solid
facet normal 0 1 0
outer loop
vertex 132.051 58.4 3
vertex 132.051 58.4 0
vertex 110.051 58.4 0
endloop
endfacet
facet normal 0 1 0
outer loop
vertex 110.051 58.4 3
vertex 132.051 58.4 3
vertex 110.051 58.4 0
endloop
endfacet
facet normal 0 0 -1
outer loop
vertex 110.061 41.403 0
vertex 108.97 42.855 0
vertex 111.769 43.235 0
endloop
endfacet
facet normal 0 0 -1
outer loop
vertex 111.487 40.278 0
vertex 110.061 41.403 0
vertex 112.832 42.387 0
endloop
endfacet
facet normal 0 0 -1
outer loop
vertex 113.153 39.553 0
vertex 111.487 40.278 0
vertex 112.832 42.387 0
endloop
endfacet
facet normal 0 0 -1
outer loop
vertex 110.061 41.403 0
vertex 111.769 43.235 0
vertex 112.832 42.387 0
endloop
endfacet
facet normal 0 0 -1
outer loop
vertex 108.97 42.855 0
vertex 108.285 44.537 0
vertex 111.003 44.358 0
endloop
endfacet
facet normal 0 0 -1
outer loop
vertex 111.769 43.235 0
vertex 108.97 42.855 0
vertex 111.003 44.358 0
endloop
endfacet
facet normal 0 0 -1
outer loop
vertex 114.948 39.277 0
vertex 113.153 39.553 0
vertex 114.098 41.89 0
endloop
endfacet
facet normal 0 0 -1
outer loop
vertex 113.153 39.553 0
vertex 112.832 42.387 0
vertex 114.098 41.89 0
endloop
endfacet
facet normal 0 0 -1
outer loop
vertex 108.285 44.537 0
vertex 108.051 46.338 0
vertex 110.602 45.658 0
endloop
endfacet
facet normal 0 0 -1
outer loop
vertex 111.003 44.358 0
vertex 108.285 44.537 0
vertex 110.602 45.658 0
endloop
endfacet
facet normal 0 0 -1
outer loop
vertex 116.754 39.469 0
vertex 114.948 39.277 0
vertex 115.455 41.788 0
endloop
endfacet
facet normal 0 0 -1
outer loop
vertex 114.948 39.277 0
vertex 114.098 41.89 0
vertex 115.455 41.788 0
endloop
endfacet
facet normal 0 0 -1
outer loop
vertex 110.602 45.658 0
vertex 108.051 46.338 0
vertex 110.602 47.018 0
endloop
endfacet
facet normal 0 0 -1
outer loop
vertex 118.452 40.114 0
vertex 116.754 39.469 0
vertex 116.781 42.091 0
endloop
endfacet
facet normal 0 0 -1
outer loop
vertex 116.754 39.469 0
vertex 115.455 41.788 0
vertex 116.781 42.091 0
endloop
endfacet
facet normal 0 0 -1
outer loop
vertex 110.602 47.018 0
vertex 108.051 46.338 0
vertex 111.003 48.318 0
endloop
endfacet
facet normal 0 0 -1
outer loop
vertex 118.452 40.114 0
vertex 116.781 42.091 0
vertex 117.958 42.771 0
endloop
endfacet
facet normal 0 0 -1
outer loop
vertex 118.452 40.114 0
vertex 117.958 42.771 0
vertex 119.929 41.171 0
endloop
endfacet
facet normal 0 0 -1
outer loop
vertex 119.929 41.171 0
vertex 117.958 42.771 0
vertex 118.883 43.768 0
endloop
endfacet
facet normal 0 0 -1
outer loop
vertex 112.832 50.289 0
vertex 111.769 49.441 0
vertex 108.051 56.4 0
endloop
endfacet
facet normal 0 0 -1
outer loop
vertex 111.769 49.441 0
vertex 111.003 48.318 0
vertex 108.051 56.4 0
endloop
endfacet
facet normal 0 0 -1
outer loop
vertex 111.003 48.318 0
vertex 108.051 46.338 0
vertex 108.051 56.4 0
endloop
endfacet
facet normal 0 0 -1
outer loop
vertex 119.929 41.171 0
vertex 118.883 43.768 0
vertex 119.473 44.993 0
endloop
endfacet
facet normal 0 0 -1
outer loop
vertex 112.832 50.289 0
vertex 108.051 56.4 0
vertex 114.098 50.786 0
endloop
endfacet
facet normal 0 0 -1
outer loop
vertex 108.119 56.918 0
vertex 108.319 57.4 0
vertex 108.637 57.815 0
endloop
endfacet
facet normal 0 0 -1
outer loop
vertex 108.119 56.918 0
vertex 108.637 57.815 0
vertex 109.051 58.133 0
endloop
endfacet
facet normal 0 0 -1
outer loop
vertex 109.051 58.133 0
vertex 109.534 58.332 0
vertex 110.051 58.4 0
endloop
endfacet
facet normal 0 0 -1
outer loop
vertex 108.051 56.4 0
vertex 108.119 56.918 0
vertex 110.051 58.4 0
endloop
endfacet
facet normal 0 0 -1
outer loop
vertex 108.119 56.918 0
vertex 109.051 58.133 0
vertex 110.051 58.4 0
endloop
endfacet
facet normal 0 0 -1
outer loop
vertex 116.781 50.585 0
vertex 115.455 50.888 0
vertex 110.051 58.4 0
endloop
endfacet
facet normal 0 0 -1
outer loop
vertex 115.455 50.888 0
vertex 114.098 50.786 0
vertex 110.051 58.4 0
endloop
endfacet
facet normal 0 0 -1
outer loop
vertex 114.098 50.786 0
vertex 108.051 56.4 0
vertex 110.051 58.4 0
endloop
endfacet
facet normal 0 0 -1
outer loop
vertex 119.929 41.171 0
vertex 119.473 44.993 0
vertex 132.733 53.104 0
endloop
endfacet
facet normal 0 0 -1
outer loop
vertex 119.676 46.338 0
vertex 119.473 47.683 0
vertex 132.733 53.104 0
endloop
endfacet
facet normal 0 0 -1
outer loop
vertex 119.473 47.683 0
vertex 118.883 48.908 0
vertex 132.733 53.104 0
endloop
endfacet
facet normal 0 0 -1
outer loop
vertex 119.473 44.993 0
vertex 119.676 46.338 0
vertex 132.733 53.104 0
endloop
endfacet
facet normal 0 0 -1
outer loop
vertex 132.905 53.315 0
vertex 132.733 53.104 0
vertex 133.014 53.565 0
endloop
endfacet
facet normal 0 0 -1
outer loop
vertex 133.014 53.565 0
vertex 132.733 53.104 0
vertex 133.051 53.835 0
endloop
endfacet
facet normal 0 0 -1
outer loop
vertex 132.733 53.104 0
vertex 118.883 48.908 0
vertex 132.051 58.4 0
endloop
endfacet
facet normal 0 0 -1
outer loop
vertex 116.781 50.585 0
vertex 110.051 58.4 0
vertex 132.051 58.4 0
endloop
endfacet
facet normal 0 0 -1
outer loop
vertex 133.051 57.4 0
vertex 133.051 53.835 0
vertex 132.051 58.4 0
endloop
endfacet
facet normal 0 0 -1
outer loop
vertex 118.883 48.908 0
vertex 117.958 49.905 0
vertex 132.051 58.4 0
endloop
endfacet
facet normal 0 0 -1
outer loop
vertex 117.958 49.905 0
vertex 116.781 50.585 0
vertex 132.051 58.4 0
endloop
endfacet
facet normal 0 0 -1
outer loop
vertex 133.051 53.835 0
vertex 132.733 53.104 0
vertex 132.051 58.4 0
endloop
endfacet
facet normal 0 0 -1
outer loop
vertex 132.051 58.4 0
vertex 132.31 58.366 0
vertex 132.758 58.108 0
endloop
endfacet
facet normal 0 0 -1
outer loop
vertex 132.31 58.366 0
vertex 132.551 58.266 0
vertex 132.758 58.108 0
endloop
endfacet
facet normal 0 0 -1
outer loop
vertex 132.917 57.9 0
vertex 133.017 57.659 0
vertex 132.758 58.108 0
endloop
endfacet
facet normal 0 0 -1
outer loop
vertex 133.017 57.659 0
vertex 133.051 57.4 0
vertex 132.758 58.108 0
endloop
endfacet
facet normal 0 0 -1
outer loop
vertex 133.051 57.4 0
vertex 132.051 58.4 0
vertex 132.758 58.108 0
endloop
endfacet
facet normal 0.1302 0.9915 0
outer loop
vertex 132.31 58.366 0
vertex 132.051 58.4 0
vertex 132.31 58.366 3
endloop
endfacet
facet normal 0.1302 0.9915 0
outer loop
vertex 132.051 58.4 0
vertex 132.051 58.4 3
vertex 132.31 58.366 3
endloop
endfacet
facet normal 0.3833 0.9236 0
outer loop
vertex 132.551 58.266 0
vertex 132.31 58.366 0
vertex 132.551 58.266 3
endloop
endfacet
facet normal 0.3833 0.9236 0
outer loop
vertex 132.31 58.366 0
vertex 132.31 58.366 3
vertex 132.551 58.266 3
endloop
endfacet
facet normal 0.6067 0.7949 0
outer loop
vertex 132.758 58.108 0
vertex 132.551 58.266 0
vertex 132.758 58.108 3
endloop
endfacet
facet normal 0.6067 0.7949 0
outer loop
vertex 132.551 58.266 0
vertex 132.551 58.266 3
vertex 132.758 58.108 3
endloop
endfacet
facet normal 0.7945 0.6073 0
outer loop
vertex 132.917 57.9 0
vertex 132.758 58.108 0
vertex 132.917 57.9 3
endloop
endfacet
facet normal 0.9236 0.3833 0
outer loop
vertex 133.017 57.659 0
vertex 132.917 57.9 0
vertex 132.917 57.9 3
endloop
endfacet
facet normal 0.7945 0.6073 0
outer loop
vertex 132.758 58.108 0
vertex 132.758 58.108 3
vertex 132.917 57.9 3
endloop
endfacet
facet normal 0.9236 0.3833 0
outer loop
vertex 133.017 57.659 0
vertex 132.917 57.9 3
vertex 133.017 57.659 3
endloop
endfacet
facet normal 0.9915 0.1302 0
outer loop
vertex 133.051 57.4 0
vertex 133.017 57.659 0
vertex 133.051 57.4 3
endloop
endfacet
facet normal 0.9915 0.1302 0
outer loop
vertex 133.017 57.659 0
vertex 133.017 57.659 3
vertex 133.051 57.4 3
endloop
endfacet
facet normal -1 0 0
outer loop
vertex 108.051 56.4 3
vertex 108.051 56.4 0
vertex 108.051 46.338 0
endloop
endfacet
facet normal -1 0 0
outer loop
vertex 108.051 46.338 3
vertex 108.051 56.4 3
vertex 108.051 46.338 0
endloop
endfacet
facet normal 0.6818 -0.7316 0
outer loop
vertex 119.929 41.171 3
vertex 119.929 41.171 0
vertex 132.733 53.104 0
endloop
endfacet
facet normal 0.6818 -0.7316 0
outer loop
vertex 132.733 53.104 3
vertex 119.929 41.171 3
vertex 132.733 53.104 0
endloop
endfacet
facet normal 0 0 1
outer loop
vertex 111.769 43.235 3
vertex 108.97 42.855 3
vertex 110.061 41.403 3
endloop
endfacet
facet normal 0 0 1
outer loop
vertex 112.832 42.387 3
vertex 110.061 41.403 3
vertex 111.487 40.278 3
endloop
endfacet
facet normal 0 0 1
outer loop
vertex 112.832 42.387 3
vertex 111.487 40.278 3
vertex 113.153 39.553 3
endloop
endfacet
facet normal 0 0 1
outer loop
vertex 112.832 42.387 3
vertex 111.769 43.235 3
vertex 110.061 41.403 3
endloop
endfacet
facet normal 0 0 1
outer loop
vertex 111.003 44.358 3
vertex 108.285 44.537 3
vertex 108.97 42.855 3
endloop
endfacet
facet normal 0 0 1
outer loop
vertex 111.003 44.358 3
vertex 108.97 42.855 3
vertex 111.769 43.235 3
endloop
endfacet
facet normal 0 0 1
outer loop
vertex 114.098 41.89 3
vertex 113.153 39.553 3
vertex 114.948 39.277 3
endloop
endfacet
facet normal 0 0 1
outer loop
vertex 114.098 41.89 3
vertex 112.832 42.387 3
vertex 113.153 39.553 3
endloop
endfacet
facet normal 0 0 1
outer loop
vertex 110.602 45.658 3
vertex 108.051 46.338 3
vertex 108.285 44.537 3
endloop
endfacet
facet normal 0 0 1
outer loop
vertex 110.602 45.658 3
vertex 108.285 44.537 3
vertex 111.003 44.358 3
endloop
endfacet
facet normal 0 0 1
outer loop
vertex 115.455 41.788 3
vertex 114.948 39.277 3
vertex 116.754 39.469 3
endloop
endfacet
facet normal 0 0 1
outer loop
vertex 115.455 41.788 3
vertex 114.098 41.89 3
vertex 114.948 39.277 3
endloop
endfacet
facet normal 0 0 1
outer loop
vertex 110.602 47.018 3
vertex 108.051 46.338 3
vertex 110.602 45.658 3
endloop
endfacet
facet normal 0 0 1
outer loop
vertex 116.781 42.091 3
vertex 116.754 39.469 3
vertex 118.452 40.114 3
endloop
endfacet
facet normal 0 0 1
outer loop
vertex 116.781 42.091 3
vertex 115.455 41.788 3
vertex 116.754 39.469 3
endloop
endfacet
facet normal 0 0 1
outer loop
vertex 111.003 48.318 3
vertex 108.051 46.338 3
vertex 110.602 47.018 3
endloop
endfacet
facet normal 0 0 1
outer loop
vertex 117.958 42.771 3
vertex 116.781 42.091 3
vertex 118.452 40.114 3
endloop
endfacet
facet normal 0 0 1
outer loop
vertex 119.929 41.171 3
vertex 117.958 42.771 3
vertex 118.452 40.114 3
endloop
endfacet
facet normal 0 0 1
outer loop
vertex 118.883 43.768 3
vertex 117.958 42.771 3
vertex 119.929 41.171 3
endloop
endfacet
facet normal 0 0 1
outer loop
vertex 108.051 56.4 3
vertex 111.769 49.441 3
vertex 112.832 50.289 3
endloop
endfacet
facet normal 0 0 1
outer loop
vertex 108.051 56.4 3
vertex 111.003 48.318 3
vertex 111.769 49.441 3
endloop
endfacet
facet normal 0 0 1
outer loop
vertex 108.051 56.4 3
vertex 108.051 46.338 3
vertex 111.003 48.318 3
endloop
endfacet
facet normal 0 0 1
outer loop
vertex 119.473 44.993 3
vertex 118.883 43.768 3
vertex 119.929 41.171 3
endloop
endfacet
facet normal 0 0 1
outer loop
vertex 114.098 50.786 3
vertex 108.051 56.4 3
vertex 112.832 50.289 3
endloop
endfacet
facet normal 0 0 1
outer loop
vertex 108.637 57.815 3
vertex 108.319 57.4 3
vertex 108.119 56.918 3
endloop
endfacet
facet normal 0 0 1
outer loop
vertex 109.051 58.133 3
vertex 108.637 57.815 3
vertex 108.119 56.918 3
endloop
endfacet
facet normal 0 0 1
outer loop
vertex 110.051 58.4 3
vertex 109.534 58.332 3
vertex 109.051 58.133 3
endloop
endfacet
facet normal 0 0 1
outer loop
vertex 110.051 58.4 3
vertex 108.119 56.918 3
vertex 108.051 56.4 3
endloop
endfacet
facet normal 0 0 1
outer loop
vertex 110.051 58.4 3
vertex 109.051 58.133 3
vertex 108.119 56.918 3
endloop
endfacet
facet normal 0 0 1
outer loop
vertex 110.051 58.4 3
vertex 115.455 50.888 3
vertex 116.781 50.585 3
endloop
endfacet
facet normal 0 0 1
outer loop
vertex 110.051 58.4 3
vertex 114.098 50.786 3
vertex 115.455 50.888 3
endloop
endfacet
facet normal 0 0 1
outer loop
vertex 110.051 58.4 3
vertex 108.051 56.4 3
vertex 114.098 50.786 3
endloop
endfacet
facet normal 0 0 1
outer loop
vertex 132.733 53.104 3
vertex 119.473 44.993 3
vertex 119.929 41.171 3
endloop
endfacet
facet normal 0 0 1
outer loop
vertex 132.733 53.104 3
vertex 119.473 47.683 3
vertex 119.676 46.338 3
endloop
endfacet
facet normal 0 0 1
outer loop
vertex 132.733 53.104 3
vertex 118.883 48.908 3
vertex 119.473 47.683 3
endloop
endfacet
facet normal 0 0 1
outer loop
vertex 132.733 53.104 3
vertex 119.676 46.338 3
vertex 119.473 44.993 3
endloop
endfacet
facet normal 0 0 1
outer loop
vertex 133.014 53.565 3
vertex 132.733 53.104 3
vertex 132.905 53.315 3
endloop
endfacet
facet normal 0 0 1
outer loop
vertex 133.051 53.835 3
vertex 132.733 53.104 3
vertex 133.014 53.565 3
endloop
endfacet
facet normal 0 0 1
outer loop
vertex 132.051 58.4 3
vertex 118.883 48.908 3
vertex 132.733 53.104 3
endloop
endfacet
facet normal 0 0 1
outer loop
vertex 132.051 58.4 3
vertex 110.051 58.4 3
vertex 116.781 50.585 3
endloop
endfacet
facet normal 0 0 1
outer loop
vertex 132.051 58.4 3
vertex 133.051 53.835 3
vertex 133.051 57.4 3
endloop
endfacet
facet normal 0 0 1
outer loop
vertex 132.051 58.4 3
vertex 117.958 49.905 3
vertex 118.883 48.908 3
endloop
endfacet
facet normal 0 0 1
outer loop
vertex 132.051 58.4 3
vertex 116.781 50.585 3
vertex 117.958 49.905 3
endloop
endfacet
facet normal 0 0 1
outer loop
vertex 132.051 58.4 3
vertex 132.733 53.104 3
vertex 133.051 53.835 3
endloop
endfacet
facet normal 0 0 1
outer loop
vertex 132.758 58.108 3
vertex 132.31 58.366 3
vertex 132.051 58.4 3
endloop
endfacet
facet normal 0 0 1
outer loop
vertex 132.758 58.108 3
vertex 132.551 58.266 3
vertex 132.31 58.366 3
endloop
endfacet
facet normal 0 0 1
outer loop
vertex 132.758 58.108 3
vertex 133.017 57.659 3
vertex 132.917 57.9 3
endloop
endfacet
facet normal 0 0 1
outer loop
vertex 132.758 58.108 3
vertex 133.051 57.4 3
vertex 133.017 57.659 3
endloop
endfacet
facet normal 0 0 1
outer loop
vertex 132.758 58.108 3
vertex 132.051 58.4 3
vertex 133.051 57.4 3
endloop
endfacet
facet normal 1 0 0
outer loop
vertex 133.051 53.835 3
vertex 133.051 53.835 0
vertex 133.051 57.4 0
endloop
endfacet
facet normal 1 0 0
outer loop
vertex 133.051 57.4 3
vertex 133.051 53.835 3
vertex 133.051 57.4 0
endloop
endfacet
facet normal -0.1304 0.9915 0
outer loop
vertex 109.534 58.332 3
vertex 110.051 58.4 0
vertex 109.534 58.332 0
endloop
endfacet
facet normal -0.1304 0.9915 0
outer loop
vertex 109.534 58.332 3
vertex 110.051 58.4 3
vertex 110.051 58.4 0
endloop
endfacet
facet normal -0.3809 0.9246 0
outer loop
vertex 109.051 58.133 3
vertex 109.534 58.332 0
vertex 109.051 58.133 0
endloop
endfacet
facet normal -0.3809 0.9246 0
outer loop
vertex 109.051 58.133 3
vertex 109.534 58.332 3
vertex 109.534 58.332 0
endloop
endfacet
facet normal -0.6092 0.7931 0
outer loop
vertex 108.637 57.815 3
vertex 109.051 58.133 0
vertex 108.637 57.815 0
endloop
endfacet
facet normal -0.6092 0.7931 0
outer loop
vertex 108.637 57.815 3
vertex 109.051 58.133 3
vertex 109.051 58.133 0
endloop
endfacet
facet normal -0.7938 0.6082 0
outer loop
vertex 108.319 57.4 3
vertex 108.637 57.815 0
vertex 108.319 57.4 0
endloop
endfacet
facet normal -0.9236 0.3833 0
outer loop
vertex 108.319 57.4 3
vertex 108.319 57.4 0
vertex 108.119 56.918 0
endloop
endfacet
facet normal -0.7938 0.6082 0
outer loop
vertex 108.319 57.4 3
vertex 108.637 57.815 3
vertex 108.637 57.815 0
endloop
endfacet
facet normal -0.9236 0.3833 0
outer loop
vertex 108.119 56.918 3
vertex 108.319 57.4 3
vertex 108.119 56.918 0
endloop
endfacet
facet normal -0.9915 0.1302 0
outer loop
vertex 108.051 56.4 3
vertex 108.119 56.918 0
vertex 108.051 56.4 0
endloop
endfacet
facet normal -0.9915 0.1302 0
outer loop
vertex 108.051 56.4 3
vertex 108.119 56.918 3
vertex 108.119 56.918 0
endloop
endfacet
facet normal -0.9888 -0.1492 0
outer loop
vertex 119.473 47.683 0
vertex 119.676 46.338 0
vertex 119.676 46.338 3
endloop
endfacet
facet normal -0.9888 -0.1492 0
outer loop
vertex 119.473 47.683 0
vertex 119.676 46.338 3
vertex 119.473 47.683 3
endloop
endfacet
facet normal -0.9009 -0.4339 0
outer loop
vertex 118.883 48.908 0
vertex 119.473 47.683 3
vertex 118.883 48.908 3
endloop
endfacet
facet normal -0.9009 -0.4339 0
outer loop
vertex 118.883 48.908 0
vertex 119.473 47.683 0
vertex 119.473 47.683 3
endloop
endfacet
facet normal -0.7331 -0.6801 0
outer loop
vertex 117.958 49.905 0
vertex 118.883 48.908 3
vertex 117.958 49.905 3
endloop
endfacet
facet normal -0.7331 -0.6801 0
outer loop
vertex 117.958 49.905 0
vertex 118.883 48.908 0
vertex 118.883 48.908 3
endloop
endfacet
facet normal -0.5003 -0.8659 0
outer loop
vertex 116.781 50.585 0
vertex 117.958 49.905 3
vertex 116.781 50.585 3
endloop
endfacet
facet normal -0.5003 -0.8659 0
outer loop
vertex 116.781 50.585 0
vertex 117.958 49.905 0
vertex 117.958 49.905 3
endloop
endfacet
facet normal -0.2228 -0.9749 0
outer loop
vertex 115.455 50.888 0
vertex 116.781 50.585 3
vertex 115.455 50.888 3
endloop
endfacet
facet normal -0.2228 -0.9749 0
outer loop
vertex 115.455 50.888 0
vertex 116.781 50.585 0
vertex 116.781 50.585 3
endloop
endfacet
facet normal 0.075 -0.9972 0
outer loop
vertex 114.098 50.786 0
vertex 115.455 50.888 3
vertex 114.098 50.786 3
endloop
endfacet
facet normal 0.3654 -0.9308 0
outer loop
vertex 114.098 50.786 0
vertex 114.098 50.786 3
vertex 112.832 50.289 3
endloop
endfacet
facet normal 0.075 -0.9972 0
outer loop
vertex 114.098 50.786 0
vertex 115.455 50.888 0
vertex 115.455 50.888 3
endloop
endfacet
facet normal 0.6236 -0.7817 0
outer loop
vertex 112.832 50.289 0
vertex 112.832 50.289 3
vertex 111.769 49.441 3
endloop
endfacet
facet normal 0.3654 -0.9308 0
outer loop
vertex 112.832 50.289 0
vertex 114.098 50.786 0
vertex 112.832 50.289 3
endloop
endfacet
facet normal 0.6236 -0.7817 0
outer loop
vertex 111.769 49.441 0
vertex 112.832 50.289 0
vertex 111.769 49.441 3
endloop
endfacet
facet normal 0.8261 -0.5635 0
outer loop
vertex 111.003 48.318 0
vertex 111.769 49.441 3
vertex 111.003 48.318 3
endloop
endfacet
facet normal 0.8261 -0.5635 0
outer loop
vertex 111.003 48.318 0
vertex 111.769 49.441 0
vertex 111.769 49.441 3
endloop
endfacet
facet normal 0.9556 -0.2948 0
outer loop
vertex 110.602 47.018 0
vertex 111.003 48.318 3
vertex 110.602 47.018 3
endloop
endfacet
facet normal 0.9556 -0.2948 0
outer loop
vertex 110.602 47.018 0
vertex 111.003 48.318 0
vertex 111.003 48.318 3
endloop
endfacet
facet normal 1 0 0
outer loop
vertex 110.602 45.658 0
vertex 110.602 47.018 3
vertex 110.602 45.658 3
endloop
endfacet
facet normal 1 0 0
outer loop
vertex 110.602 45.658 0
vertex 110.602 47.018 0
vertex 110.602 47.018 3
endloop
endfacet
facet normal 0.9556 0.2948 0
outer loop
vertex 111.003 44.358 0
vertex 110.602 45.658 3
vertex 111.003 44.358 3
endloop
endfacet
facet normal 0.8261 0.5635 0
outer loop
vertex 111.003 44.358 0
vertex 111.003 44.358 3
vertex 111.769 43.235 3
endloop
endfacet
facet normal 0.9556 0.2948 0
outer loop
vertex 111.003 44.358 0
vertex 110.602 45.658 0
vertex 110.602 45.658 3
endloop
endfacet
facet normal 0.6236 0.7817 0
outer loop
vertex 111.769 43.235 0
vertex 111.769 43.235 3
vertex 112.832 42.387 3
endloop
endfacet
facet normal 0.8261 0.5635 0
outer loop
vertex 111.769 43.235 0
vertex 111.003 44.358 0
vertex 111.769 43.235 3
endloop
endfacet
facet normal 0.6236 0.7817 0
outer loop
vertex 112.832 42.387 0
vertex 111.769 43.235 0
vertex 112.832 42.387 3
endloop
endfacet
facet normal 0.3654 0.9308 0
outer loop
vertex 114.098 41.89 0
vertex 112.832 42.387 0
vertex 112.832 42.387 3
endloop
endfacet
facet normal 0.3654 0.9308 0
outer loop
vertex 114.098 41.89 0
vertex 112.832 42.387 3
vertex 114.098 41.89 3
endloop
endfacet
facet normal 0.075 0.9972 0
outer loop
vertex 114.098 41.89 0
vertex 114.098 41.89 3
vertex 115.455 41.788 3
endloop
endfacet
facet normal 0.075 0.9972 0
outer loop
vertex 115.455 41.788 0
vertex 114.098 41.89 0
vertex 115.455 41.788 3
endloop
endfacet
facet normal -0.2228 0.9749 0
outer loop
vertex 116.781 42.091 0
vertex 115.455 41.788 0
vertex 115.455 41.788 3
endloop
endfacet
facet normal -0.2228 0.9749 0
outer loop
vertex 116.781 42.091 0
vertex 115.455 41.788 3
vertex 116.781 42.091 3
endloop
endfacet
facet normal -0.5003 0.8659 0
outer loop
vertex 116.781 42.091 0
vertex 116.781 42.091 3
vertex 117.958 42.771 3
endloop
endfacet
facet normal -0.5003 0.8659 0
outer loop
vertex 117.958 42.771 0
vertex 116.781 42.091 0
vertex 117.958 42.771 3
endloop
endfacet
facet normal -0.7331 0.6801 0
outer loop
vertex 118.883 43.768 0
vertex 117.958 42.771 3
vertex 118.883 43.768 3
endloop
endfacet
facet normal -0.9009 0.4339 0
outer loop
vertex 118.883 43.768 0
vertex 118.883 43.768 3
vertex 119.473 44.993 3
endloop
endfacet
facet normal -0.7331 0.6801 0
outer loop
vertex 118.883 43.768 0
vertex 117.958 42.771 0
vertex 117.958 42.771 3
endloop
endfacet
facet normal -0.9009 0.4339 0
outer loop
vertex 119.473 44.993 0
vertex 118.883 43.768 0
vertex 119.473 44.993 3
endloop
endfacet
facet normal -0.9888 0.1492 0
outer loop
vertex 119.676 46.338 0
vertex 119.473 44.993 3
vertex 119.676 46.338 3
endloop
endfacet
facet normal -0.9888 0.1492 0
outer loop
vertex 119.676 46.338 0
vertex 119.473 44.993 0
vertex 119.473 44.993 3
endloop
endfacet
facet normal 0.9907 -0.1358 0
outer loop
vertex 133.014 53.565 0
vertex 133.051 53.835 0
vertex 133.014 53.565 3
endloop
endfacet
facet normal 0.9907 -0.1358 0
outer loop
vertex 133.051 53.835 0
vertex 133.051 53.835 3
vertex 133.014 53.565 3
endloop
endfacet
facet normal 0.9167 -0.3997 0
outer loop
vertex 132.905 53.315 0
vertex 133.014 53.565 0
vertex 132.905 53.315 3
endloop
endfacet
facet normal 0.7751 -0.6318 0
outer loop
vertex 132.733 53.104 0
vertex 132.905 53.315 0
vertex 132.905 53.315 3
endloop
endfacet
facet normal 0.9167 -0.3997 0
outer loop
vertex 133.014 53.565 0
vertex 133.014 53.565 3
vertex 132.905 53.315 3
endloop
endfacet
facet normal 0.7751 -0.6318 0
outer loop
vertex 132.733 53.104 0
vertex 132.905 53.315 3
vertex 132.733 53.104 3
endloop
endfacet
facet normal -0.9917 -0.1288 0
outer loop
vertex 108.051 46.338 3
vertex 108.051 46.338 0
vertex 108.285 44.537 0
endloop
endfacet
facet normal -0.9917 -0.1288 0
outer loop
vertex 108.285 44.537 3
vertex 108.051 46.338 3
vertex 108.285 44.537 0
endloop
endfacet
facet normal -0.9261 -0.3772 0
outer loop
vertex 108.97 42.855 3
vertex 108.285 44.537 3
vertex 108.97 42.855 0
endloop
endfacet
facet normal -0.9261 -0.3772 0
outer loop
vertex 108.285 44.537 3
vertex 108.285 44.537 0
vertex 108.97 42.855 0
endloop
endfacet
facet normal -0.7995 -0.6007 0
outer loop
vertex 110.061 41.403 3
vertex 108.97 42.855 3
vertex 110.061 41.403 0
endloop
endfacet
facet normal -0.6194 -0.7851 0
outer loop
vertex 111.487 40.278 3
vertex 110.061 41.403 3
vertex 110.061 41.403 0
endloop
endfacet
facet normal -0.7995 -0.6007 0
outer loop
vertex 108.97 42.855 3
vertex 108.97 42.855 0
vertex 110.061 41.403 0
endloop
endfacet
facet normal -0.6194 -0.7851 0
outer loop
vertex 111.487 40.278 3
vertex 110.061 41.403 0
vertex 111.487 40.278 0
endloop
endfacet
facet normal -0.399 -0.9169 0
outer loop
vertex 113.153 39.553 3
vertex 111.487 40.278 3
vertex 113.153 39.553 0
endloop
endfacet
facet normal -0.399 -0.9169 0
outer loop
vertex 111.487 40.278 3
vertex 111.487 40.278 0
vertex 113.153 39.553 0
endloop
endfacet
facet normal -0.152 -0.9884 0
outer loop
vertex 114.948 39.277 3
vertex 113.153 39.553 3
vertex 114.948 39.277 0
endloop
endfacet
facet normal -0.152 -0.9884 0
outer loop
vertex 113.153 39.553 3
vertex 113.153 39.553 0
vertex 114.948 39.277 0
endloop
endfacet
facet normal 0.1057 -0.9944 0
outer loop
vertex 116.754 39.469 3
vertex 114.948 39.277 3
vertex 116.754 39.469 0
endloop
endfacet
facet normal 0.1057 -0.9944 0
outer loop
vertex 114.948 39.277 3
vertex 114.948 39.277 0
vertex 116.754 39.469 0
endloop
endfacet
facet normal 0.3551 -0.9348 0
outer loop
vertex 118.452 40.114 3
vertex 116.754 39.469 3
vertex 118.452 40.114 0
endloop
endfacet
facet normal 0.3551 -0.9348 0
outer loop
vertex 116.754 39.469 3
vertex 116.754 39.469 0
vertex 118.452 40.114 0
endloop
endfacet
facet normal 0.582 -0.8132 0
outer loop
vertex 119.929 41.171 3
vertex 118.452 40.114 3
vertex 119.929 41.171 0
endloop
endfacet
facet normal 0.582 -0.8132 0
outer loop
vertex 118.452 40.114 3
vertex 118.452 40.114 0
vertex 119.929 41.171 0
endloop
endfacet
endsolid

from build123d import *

# Parameters (mm, degrees)
SKETCH1_R           = 7.0625
SKETCH1_R_2         = 4.5625
BOSS_EXTRUDE1_DEPTH = 3
FILLET1_R           = 2
FILLET2_R           = 1


with BuildPart() as part:
    # Sketch1 → Boss-Extrude1 (new body)
    with BuildSketch(Plane.XY):
        with Locations((115.113664311, 46.337958859)):
            Circle(SKETCH1_R)
        with Locations((115.113664311, 46.337958859)):
            Circle(SKETCH1_R_2, mode=Mode.SUBTRACT)
        with BuildLine():
            ThreePointArc((108.051164311, 46.337958859), (110.119722669, 51.331900502), (115.113664311, 53.400458859))
            Line((115.113664311, 53.400458859), (108.051164311, 53.400458859))
            Line((108.051164311, 53.400458859), (108.051164311, 46.337958859))
        make_face()
        with BuildLine():
            Line((108.051164311, 53.400458859), (115.113664311, 53.400458859))
            ThreePointArc((115.113664311, 53.400458859), (120.107605953, 51.331900502), (122.176164311, 46.337958859))
            ThreePointArc((122.176164311, 46.337958859), (121.589956666, 43.520771685), (119.928647546, 41.171253652))
            Line((119.928647546, 41.171253652), (133.051164311, 53.400458859))
            Line((133.051164311, 53.400458859), (133.051164311, 58.400458859))
            Line((133.051164311, 58.400458859), (108.051164311, 58.400458859))
            Line((108.051164311, 58.400458859), (108.051164311, 53.400458859))
        make_face()
    extrude(amount=BOSS_EXTRUDE1_DEPTH)

    # Fillet1
    fillet1_edges = [part.edges().sort_by_distance(p)[0] for p in [
        (108.051164311, 58.400458859, 1.5),
    ]]
    fillet(fillet1_edges, radius=FILLET1_R)

    # Fillet2
    fillet2_edges = [part.edges().sort_by_distance(p)[0] for p in [
        (133.051164311, 58.400458859, 1.5),
        (133.051164311, 53.400458859, 1.5),
    ]]
    fillet(fillet2_edges, radius=FILLET2_R)


solid = part.part
